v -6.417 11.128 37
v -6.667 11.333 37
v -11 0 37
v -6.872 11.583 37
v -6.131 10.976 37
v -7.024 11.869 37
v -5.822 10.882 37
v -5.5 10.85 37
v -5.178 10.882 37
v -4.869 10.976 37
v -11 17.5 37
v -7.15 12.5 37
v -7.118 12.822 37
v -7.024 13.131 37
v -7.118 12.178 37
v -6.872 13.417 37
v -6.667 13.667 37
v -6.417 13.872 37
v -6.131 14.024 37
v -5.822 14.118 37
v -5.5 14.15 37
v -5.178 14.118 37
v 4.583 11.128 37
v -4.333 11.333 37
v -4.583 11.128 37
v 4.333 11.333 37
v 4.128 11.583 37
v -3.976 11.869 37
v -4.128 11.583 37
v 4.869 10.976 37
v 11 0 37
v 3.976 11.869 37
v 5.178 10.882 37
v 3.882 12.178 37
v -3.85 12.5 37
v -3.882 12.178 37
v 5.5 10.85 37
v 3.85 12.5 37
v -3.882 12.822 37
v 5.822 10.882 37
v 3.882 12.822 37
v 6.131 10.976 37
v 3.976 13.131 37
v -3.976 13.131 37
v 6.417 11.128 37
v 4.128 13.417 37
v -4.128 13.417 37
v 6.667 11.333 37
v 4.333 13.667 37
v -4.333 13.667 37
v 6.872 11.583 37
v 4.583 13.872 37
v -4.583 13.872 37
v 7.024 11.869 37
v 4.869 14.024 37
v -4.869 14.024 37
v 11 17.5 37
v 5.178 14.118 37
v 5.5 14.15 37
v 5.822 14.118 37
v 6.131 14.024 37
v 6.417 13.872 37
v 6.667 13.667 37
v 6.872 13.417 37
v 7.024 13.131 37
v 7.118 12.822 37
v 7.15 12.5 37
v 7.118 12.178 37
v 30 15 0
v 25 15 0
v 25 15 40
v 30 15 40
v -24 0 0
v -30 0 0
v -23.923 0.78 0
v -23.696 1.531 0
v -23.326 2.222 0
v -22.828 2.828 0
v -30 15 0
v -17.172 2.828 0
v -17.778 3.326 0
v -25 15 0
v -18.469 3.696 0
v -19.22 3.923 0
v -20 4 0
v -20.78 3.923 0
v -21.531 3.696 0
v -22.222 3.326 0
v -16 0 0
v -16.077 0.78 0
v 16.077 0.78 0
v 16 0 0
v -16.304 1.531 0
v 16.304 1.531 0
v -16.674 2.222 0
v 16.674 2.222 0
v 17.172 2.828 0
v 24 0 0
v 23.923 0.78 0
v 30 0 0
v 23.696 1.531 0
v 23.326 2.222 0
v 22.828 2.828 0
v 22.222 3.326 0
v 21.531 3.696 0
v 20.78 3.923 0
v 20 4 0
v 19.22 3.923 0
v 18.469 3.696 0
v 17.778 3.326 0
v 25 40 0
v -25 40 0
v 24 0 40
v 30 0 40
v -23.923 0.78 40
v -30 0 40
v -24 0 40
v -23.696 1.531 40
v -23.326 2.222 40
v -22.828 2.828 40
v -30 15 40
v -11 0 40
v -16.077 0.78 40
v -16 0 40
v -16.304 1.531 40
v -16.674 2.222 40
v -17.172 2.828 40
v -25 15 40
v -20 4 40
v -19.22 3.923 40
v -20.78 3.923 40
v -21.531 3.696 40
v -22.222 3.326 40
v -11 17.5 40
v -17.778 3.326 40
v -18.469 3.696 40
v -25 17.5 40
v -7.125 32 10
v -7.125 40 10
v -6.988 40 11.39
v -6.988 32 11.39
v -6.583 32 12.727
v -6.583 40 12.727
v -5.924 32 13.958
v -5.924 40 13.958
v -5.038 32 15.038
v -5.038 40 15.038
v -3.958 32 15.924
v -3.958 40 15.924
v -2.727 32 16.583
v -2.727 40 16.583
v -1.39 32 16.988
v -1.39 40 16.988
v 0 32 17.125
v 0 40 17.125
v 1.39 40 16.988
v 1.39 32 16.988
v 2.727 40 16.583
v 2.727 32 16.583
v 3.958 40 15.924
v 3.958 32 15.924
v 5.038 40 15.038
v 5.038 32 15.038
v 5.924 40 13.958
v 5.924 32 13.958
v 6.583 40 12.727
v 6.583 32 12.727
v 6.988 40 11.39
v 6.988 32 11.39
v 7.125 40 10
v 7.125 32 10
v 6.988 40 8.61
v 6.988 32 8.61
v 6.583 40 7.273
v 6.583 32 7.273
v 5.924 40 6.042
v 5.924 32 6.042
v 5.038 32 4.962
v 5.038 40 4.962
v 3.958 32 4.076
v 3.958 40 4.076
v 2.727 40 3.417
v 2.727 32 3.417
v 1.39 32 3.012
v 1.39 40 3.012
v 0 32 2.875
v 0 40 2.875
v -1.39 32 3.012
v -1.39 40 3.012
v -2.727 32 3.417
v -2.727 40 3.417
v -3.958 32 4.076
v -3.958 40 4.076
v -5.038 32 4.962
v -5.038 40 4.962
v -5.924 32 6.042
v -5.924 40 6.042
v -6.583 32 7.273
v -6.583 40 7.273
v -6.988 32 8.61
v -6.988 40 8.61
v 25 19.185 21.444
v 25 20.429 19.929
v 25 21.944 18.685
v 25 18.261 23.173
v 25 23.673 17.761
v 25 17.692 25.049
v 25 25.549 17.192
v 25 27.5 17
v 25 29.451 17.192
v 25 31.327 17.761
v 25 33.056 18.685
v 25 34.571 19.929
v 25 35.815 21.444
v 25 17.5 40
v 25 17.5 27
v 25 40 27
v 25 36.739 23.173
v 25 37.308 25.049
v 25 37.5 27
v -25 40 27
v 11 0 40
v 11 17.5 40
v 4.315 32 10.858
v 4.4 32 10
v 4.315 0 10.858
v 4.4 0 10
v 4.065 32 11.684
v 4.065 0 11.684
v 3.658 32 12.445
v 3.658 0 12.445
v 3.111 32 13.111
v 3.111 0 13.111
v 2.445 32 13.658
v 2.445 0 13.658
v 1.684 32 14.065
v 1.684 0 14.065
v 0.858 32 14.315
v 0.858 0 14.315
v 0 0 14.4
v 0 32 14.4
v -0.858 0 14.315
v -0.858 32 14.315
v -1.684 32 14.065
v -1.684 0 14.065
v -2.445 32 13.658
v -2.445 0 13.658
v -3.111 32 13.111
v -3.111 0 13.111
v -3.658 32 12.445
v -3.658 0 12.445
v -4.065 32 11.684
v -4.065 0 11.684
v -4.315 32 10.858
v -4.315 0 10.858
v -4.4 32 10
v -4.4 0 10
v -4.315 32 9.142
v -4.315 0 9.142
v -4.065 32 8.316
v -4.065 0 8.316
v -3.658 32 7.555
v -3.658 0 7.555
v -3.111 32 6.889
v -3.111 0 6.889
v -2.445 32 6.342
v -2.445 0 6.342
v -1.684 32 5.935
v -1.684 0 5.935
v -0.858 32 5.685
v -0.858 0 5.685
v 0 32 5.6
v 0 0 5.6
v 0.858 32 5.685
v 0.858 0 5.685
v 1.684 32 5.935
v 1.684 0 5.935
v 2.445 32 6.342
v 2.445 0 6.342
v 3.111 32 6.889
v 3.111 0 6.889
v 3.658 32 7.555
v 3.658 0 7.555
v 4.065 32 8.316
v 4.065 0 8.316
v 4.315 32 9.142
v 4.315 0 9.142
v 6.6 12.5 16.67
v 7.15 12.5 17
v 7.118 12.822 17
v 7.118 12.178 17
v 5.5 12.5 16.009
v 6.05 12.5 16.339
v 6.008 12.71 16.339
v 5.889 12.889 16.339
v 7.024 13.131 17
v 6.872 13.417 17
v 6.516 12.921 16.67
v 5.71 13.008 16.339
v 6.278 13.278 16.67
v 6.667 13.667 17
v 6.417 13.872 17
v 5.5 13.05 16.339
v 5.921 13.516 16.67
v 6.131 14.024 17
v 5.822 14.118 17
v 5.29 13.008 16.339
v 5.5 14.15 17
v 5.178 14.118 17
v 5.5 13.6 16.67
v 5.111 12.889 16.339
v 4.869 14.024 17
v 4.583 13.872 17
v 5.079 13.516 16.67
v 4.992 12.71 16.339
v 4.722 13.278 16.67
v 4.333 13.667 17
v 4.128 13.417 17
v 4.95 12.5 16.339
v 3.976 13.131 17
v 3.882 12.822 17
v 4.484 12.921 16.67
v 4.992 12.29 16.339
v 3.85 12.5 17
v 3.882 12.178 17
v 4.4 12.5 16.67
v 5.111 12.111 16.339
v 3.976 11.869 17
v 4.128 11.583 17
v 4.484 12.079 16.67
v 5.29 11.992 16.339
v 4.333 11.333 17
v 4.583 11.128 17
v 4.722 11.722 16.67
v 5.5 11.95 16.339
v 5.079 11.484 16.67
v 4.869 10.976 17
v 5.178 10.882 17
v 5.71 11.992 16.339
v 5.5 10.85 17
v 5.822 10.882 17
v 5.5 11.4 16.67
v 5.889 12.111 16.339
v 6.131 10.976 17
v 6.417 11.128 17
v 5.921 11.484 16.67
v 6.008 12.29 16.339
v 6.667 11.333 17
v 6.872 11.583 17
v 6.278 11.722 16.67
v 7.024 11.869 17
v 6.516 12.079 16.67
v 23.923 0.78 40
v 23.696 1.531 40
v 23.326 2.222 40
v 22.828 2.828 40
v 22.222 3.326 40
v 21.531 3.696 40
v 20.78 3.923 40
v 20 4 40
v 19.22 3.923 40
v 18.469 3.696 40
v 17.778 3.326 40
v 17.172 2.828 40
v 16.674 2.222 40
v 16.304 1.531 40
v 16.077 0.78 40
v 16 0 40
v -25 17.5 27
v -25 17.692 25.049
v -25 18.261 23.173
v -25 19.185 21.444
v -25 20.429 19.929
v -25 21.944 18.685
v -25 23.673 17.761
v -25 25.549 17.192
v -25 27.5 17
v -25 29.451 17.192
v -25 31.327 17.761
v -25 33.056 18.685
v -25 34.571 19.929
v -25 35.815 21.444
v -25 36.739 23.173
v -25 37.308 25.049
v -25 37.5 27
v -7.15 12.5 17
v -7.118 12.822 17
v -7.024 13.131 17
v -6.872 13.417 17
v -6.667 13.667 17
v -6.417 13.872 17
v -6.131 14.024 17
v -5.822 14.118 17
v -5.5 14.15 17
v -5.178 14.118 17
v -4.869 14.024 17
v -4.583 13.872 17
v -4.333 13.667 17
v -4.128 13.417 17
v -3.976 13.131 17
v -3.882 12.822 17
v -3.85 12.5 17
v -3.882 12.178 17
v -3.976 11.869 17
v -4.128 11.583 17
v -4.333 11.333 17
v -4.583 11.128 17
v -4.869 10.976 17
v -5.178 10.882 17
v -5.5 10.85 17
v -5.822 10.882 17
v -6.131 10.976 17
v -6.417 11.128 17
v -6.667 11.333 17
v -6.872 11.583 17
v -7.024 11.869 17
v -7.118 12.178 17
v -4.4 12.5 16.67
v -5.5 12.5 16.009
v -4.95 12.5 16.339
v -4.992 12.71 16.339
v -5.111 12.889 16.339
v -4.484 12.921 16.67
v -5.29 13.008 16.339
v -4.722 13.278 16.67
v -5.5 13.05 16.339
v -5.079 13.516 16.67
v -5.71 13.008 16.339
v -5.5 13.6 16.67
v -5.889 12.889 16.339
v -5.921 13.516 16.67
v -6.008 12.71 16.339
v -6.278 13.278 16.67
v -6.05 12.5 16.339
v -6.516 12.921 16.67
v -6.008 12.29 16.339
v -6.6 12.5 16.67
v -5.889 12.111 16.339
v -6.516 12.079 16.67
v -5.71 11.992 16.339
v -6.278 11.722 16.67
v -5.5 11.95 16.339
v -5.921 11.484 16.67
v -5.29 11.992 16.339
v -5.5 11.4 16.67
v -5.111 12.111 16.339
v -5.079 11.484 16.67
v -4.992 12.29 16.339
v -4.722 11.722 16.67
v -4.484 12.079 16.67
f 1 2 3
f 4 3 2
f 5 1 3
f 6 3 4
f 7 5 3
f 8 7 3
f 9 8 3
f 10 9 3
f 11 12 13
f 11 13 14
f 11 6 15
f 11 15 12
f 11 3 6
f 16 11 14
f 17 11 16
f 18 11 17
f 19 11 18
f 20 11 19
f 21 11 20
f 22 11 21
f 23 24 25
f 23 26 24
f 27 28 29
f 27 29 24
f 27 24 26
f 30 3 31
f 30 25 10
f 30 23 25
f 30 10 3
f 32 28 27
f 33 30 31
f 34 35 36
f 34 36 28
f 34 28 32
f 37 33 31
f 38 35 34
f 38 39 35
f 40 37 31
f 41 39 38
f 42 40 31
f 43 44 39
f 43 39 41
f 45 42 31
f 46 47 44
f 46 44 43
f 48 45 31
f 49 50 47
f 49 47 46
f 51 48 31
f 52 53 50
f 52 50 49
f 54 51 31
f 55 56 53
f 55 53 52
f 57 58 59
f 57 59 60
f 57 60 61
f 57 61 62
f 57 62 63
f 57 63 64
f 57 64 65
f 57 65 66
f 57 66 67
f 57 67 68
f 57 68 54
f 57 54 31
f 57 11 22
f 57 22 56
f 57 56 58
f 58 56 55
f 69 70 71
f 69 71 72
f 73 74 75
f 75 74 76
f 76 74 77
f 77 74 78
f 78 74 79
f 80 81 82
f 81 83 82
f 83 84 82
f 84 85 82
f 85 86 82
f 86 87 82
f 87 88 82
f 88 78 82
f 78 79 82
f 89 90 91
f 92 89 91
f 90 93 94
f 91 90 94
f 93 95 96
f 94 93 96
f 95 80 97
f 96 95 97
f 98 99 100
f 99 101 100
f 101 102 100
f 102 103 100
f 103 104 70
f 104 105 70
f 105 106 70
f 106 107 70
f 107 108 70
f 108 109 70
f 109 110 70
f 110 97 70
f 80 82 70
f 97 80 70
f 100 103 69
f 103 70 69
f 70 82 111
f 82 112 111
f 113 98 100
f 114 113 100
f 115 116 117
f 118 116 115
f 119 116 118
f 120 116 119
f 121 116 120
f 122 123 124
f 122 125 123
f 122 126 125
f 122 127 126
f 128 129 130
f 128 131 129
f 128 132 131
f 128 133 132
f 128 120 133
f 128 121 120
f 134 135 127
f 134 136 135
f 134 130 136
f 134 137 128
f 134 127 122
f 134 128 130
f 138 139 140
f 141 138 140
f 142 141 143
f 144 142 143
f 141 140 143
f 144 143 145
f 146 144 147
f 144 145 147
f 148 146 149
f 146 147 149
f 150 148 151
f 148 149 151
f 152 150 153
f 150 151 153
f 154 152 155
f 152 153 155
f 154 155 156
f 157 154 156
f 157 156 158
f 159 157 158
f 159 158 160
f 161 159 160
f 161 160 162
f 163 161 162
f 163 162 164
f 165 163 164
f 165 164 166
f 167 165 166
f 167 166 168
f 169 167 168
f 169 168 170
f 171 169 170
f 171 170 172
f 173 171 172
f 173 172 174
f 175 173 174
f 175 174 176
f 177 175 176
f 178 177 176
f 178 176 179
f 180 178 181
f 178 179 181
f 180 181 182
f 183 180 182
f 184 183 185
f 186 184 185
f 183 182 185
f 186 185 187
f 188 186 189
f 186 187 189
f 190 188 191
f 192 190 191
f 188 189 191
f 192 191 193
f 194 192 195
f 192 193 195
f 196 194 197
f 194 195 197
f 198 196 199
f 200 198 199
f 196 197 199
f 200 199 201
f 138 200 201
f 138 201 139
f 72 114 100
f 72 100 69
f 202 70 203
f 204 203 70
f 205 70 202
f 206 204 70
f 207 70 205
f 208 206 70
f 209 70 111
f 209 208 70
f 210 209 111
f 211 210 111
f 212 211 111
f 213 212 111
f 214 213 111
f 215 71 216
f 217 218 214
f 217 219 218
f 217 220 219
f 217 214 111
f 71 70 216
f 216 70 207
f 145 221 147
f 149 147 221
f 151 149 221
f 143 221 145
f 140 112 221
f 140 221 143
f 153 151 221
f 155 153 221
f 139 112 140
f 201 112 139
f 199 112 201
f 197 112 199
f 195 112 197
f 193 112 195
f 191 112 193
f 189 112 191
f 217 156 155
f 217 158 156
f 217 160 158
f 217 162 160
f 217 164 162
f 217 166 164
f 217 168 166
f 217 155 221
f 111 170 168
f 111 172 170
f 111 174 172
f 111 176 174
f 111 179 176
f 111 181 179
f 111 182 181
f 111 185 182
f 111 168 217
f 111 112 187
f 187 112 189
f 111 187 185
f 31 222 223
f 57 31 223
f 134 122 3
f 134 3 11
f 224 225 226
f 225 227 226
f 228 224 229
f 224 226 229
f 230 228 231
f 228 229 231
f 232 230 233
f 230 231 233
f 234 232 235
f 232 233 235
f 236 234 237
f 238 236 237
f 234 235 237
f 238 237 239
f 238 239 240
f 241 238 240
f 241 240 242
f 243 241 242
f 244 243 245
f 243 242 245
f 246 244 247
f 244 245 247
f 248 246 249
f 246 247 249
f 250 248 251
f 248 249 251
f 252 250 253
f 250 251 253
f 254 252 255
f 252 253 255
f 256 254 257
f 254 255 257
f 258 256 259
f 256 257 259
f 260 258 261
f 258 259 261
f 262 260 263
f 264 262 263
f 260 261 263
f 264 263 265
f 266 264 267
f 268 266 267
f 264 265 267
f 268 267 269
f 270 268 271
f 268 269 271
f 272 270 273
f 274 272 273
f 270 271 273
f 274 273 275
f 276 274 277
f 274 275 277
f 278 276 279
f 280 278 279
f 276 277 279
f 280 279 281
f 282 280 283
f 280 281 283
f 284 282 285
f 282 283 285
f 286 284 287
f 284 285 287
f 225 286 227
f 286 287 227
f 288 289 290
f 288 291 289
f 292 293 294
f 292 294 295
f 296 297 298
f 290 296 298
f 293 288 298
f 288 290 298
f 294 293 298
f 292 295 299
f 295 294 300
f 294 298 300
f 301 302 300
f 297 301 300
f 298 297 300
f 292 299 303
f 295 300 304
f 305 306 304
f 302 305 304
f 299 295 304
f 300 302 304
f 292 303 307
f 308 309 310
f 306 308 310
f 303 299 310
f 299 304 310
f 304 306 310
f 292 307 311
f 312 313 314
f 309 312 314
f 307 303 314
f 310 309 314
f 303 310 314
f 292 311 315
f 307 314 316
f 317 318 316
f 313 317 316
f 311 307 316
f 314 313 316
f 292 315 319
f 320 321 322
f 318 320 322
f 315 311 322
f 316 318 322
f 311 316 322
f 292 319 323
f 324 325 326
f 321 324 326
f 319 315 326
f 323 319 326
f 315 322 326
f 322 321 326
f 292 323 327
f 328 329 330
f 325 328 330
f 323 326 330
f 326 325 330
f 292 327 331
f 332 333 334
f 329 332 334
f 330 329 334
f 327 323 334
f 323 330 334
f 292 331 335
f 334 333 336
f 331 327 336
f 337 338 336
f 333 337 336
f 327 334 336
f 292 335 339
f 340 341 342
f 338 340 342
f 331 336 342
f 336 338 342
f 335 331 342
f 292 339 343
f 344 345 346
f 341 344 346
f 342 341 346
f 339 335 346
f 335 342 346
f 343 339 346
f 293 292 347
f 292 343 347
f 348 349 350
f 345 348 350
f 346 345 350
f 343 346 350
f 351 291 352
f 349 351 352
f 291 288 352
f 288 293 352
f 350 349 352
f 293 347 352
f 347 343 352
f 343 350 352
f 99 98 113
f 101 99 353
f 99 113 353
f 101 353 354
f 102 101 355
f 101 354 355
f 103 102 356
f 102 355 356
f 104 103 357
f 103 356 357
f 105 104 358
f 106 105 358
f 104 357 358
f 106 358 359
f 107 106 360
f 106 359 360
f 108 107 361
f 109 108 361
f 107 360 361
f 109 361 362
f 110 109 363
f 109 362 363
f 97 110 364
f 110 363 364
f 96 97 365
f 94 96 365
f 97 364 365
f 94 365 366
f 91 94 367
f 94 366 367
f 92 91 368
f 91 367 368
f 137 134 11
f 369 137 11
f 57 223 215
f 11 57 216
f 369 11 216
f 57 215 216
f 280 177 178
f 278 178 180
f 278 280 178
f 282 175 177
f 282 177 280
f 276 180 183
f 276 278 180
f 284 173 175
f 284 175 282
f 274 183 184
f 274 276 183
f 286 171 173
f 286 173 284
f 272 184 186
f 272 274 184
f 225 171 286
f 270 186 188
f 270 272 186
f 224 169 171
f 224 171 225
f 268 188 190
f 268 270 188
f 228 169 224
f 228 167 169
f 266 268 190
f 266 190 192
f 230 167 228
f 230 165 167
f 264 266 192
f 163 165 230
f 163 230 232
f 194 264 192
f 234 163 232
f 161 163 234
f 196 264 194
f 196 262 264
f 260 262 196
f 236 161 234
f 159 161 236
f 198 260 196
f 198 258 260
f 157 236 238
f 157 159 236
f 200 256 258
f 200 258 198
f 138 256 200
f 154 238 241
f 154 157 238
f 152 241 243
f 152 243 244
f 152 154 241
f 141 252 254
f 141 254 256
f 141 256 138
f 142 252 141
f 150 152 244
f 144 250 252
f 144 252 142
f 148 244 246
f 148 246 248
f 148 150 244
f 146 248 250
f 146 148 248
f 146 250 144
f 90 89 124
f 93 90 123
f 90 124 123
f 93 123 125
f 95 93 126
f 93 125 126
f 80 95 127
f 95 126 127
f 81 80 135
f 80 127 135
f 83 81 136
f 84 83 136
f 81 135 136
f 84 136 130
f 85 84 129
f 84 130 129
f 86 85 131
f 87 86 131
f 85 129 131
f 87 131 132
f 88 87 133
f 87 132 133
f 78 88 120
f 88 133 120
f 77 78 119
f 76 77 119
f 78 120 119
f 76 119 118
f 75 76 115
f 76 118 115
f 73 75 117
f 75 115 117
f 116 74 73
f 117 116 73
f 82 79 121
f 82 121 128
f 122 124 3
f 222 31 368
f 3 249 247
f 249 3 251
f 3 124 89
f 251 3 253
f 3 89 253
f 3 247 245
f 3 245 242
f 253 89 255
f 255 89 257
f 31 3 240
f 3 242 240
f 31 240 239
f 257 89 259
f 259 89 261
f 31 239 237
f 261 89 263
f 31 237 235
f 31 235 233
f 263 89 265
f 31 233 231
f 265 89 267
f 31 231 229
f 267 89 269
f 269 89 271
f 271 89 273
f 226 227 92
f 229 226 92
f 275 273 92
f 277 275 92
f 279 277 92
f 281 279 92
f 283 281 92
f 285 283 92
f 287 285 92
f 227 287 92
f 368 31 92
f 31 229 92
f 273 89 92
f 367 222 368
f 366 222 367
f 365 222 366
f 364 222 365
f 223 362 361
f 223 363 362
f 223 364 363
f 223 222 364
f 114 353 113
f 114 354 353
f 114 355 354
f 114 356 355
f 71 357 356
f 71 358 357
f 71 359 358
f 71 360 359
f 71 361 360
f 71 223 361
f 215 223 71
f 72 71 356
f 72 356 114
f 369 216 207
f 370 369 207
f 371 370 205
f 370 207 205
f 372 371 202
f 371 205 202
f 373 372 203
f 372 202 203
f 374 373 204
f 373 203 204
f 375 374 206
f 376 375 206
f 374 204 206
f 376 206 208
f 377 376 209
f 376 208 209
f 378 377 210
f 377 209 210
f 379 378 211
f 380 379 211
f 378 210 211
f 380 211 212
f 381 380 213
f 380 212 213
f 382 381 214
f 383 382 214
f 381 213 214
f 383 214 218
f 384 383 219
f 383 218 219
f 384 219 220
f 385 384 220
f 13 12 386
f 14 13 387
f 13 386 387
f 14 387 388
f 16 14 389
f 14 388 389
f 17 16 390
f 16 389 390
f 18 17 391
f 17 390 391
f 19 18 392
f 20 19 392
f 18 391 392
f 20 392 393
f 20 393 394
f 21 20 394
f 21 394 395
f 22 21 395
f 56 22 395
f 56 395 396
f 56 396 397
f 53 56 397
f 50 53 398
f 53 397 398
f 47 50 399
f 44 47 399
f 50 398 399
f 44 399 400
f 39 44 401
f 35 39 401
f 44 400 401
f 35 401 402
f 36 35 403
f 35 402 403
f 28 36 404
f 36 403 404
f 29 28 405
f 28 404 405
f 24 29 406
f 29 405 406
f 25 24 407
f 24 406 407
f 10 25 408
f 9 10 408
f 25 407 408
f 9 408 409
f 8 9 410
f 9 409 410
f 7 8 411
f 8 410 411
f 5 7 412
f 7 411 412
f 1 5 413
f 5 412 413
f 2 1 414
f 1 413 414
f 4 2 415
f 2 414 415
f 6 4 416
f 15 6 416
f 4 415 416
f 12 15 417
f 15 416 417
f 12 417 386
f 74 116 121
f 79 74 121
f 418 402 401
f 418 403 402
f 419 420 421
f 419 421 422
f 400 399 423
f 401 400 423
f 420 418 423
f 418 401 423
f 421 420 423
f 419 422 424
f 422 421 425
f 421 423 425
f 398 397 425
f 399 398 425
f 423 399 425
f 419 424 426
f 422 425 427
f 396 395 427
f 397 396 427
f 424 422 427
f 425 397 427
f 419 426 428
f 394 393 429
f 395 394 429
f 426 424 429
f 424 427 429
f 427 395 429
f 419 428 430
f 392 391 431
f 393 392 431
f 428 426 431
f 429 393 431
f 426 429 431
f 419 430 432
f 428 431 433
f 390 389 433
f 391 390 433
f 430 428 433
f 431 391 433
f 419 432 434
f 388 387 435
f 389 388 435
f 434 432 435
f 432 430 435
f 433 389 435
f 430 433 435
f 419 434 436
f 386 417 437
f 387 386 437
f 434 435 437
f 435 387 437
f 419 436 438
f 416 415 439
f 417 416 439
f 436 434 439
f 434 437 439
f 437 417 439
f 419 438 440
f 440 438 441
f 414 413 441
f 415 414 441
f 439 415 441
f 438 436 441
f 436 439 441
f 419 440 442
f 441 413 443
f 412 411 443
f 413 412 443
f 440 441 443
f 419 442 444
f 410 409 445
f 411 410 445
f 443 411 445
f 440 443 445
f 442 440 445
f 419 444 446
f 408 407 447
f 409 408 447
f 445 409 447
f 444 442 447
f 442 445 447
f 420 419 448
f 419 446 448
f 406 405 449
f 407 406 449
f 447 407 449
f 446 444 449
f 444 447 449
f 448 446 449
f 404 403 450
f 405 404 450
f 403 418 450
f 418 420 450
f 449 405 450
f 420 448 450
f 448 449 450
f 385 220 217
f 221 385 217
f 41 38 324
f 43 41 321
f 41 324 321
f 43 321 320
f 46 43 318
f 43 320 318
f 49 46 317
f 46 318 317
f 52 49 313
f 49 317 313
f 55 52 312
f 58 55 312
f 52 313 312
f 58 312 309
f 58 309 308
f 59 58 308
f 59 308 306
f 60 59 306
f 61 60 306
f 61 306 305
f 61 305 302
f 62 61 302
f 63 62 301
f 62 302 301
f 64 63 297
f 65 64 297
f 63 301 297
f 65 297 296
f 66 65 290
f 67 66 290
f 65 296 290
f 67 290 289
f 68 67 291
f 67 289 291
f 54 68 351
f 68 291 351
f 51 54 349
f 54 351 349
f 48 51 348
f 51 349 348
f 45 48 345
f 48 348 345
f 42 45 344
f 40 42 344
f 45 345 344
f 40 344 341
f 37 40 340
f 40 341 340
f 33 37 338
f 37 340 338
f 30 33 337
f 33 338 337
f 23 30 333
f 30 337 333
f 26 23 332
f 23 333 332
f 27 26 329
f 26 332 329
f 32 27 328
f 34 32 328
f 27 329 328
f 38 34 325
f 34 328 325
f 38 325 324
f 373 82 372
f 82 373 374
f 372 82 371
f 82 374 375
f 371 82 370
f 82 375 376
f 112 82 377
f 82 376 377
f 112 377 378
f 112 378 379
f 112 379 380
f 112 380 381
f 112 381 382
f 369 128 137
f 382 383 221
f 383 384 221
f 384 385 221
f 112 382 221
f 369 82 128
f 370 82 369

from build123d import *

# Parameters (mm, degrees)
F0_W            = 60
F0_H            = 40
F1_DEPTH        = 40
F2_W            = 5
F2_H            = 25
F3_DEPTH        = 40.001
F5_DEPTH        = 55.001
F7_DEPTH        = 40.001
F8_W            = 22
F8_H            = 17.5
F9_DEPTH        = 3
F11_D           = 3.3
F11_DEPTH       = 20
F11_TIP         = 0.9914200214
F13_D           = 8.8
F13_DEPTH       = 50
F13_CBORE_D     = 14.25
F13_CBORE_DEPTH = 8
F13_TIP         = 2.6437867237


with BuildPart() as f1:
    # F0 (on Top) → F1 (new body)
    with BuildSketch(Plane.XY):
        with Locations((0, 20)):
            Rectangle(F0_W, F0_H)
    extrude(amount=F1_DEPTH)

    # F2 (on face) → F3 (cut, through all)
    with BuildSketch(Plane.XY.offset(40)):
        with Locations((-27.5, 27.5)):
            Rectangle(F2_W, F2_H)
        with Locations((27.5, 27.5)):
            Rectangle(F2_W, F2_H)
    extrude(amount=-F3_DEPTH, mode=Mode.SUBTRACT)

    # F4 (on face) → F5 (cut, through all)
    with BuildSketch(Plane.YZ.offset(25)):
        with BuildLine():
            ThreePointArc((17.5, 27), (27.5, 17), (37.5, 27))
            ThreePointArc((37.5, 27), (27.5, 37), (17.5, 27))
        make_face()
        with BuildLine():
            ThreePointArc((17.5, 27), (27.5, 37), (37.5, 27))
            Line((37.5, 27), (40, 27))
            Line((40, 27), (40, 40))
            Line((40, 40), (17.5, 40))
            Line((17.5, 40), (17.5, 27))
        make_face()
    extrude(amount=-F5_DEPTH, mode=Mode.SUBTRACT)

    # F6 (on face) → F7 (cut, through all)
    with BuildSketch(Plane.XY.offset(40)):
        with BuildLine():
            Line((-24, 0), (-16, 0))
            ThreePointArc((-16, 0), (-20, 4), (-24, 0))
        make_face()
        with BuildLine():
            ThreePointArc((24, 0), (20, 4), (16, 0))
            Line((16, 0), (24, 0))
        make_face()
    extrude(amount=-F7_DEPTH, mode=Mode.SUBTRACT)

    # F8 (on face) → F9 (cut)
    with BuildSketch(Plane.XY.offset(40)):
        with Locations((0, 8.75)):
            Rectangle(F8_W, F8_H)
    extrude(amount=-F9_DEPTH, mode=Mode.SUBTRACT)

    # F11
    with Locations(Plane.XY.offset(37)):
        with Locations((-5.5, 12.5), (5.5, 12.5)):
            Hole(F11_D / 2, depth=F11_DEPTH)
            with Locations((0, 0, -(F11_DEPTH + F11_TIP / 2))):  # 118° drill point
                Cone(0, F11_D / 2, F11_TIP, mode=Mode.SUBTRACT)

    # F13
    with Locations(Plane(origin=(0, 40, 0), x_dir=(-1, 0, 0), z_dir=(0, 1, 0))):
        with Locations((0, 10)):
            CounterBoreHole(F13_D / 2, F13_CBORE_D / 2, F13_CBORE_DEPTH, depth=F13_DEPTH)
            with Locations((0, 0, -(F13_DEPTH + F13_TIP / 2))):  # 118° drill point
                Cone(0, F13_D / 2, F13_TIP, mode=Mode.SUBTRACT)


solid = f1.part
